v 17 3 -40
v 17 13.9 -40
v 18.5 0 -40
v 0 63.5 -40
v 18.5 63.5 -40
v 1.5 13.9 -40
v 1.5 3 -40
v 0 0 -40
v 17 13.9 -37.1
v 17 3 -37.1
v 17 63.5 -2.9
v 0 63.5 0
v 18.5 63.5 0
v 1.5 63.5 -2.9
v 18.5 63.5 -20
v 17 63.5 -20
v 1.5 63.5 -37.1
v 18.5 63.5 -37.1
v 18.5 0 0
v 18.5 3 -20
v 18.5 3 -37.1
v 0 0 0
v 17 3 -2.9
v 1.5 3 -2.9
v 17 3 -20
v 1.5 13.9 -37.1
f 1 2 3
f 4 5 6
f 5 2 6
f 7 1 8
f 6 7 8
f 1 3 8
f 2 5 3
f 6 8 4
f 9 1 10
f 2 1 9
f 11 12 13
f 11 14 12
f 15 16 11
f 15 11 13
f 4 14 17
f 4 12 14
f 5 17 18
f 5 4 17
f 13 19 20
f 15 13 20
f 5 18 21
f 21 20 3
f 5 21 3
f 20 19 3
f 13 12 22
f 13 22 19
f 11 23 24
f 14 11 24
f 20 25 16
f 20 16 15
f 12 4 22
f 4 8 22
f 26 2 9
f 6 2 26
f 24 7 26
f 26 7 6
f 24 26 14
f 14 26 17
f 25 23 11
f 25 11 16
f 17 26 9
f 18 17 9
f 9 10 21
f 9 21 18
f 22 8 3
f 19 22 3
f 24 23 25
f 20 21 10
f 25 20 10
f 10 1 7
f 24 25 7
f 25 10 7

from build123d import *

# Parameters (mm, degrees)
SKETCH1_W           = 18.5
SKETCH1_H           = 40
BOSS_EXTRUDE1_DEPTH = 3
SKETCH2_W           = 1.5
SKETCH2_H           = 17.1
BOSS_EXTRUDE2_DEPTH = 60.5
CUT_EXTRUDE1_REACH  = 79.295
SKETCH4_W           = 15.5
SKETCH4_H           = 10.9


with BuildPart() as part:
    # Sketch1 → Boss-Extrude1 (new body)
    with BuildSketch(Plane(origin=(0, 0, 0), x_dir=(1, 0, 0), z_dir=(0, 1, 0))):
        with Locations((9.25, 20)):
            Rectangle(SKETCH1_W, SKETCH1_H)
    extrude(amount=BOSS_EXTRUDE1_DEPTH)

    # Sketch2 → Boss-Extrude2 (add)
    with BuildSketch(Plane(origin=(0, 3, 0), x_dir=(1, 0, 0), z_dir=(0, 1, 0))):
        Polygon((18.5, 40), (0, 40), (0, 37.1), (1.5, 37.1), (18.5, 37.1), align=None)
        Polygon((1.5, 37.1), (0, 37.1), (0, 0), (1.5, 0), (1.5, 2.9), align=None)
        Polygon((17, 2.9), (1.5, 2.9), (1.5, 0), (18.5, 0), (18.5, 2.9), align=None)
        with Locations((17.75, 11.45)):
            Rectangle(SKETCH2_W, SKETCH2_H)
    extrude(amount=BOSS_EXTRUDE2_DEPTH)

    # Sketch4 → Cut-Extrude1 (cut, up to next)
    with BuildSketch(Plane(origin=(0, 0, -40), x_dir=(-1, 0, 0), z_dir=(0, 0, -1)), mode=Mode.PRIVATE) as cut_extrude1_sk1:
        with Locations((-9.25, 8.45)):
            Rectangle(SKETCH4_W, SKETCH4_H)
    cut_extrude1_tool1 = extrude(cut_extrude1_sk1.sketch, amount=-CUT_EXTRUDE1_REACH, mode=Mode.PRIVATE) & part.part
    add(cut_extrude1_tool1.solids().sort_by_distance((9.25, 8.45, -40))[0], mode=Mode.SUBTRACT)


solid = part.part
